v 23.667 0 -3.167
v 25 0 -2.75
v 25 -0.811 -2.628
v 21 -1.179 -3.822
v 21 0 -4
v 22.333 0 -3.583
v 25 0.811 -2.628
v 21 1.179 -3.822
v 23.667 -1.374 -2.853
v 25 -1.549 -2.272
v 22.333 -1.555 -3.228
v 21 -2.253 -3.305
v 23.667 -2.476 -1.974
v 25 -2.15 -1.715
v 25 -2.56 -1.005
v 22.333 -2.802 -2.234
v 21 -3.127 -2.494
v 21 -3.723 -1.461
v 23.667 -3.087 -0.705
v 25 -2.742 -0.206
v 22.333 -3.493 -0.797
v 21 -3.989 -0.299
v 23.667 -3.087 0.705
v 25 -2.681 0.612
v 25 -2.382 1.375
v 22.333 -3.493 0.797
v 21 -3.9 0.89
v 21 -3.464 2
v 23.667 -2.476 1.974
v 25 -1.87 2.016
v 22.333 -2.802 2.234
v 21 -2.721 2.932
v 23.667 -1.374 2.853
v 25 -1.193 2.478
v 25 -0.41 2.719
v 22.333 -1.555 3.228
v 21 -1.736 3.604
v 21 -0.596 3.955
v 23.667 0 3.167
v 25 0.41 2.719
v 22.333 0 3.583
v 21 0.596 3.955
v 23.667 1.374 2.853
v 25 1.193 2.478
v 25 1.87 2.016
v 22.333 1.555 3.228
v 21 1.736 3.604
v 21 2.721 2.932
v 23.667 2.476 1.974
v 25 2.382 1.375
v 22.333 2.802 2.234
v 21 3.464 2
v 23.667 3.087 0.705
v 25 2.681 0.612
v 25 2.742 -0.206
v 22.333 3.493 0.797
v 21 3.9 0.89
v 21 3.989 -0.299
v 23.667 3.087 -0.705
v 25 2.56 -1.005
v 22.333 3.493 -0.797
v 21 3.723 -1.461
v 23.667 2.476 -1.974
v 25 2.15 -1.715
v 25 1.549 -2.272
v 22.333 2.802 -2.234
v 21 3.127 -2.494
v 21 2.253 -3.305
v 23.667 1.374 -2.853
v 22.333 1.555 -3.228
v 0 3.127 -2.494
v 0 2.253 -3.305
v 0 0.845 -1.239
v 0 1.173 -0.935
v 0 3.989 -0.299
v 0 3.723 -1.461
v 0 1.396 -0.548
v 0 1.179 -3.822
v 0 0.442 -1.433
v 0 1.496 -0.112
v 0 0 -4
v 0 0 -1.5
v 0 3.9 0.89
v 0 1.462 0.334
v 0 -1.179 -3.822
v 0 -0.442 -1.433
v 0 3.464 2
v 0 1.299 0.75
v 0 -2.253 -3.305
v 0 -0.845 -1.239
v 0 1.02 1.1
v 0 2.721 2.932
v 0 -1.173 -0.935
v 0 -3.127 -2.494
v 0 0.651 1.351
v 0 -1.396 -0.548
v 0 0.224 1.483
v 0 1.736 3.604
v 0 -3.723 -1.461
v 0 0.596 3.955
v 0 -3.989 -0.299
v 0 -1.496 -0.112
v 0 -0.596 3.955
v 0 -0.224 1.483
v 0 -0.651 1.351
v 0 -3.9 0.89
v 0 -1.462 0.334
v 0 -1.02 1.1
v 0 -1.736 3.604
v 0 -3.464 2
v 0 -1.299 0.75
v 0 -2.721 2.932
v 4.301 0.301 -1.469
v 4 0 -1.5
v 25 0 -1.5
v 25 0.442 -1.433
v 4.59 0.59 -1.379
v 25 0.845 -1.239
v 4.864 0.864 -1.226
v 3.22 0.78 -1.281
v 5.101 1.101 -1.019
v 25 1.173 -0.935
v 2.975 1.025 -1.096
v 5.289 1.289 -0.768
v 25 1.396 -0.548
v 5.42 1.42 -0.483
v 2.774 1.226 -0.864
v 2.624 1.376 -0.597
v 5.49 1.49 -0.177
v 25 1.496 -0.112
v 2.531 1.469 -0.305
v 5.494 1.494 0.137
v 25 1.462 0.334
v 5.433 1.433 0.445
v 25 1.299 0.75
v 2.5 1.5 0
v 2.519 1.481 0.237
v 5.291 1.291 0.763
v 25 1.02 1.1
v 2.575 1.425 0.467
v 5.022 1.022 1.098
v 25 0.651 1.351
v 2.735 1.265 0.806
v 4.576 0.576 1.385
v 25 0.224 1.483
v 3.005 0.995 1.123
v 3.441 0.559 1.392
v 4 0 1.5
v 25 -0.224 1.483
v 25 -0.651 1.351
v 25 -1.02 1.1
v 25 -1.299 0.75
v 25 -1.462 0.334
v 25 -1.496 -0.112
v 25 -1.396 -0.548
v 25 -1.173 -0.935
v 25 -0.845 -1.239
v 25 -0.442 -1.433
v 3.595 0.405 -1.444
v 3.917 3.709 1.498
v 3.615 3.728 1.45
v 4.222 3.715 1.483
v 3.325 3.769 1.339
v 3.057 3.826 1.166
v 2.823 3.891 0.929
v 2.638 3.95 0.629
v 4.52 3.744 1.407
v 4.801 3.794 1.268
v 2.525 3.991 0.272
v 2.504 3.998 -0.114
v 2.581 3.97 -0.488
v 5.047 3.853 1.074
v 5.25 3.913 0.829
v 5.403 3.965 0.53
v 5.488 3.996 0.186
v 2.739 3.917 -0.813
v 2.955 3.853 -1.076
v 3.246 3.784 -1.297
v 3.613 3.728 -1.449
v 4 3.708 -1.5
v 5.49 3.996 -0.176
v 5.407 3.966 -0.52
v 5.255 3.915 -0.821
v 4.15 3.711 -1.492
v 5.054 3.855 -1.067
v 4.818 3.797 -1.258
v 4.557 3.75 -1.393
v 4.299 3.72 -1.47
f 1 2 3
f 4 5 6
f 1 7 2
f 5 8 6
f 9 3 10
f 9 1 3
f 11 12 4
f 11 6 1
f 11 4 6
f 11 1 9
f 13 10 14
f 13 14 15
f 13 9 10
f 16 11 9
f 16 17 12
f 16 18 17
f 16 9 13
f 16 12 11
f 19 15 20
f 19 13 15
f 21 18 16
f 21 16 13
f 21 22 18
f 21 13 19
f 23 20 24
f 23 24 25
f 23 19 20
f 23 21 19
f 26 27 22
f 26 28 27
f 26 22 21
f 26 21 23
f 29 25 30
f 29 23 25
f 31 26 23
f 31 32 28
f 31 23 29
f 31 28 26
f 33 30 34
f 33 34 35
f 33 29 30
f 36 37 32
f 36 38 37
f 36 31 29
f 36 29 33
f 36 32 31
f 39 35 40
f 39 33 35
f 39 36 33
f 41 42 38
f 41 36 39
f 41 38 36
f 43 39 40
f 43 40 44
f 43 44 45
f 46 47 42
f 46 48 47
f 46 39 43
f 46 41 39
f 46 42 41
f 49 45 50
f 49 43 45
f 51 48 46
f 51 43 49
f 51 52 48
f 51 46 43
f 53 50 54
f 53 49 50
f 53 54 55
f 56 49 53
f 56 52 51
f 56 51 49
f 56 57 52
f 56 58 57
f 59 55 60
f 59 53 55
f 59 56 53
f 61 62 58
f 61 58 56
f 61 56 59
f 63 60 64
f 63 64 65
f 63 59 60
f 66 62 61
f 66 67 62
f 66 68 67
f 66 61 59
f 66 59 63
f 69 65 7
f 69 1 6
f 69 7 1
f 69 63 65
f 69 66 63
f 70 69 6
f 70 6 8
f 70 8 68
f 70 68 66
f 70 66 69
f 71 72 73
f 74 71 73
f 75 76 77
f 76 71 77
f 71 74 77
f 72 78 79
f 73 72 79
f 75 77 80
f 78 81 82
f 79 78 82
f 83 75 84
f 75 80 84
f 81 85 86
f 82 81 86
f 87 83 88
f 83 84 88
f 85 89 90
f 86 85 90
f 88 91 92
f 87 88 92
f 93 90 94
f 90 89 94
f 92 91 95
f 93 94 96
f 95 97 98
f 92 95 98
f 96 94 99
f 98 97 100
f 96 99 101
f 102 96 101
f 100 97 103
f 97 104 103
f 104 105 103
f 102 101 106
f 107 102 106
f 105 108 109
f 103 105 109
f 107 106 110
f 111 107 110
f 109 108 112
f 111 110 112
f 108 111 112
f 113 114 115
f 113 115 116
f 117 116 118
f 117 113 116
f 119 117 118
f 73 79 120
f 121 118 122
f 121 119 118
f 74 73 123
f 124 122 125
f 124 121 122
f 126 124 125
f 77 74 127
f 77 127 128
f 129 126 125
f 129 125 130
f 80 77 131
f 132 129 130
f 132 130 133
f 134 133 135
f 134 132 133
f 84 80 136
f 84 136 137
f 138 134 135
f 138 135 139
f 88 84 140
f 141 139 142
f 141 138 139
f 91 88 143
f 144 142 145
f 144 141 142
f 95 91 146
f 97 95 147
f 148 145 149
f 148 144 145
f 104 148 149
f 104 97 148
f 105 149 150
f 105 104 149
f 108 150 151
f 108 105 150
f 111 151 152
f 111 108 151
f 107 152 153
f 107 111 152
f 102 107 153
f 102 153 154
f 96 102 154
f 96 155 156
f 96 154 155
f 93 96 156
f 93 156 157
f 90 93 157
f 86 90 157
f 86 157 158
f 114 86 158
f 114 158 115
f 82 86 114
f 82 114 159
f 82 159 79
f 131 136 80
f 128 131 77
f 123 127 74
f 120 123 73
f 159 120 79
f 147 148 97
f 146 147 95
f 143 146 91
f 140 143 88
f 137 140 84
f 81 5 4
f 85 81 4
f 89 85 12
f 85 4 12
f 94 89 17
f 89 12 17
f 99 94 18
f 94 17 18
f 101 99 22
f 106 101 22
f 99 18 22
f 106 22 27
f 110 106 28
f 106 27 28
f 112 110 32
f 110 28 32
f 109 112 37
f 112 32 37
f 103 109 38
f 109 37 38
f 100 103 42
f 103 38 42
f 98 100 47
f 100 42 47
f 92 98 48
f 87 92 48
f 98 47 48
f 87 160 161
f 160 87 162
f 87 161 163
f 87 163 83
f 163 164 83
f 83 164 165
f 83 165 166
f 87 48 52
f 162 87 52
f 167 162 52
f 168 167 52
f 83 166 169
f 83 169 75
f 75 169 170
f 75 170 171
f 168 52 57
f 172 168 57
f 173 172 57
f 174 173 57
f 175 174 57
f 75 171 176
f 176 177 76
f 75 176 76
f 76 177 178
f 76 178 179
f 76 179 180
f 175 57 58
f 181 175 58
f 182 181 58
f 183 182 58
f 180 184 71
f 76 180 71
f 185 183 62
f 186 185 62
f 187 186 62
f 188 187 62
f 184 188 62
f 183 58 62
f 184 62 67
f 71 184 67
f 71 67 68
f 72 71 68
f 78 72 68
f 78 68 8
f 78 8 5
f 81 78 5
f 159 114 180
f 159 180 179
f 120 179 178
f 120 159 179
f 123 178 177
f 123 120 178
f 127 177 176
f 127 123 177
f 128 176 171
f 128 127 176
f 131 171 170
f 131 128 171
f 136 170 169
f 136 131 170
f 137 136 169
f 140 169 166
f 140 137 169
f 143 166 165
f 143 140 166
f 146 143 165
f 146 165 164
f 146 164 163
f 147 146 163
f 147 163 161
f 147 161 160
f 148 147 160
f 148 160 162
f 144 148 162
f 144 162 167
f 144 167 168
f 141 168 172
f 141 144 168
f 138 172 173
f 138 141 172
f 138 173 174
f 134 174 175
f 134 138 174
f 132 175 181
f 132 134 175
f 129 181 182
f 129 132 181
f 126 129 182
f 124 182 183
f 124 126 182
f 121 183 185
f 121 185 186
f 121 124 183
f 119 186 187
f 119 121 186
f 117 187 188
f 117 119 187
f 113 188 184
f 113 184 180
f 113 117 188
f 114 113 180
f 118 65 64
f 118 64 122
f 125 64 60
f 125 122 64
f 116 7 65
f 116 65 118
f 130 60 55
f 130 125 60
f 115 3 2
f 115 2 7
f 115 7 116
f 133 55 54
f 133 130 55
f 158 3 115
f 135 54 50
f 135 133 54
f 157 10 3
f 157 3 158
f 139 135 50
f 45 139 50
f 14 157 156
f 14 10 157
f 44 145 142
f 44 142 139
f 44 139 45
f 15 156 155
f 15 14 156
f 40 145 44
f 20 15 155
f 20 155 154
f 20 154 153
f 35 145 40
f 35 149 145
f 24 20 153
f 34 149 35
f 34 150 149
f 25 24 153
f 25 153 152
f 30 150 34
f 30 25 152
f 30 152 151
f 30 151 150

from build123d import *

# Parameters (mm, degrees)
SKETCH1_W      = 21
SKETCH1_H      = 4
SKETCH2_R      = 1.5
EXTRUDE4_DEPTH = 26.632011236
SKETCH3_R      = 1.5
EXTRUDE5_DEPTH = 10


with BuildPart() as part:
    # Sketch1 → Revolve1 (revolve)
    with BuildSketch(Plane.XY, mode=Mode.PRIVATE) as revolve1_sk:
        with Locations((10.5, 2)):
            Rectangle(SKETCH1_W, SKETCH1_H)
        Polygon((21, 4), (21, 0), (25, 0), (25, 2.75), align=None)
    revolve(revolve1_sk.sketch.rotate(Axis((25, 0, 0), (-1, 0, 0)), 90), axis=Axis((25, 0, 0), (-1, 0, 0)))

    # Sketch2 → Extrude4 (cut, through all)
    with BuildSketch(Plane(origin=(0, 0, 0), x_dir=(0, 0, -1), z_dir=(1, 0, 0))):
        Circle(SKETCH2_R)
    extrude(amount=EXTRUDE4_DEPTH, mode=Mode.SUBTRACT)

    # Sketch3 → Extrude5 (cut)
    with BuildSketch(Plane(origin=(0, 0, 0), x_dir=(1, 0, 0), z_dir=(0, 1, 0))):
        with Locations(Location((4, 0, 0), (0, 0, 90))):
            Circle(SKETCH3_R)
    extrude(amount=EXTRUDE5_DEPTH, mode=Mode.SUBTRACT)


solid = part.part
